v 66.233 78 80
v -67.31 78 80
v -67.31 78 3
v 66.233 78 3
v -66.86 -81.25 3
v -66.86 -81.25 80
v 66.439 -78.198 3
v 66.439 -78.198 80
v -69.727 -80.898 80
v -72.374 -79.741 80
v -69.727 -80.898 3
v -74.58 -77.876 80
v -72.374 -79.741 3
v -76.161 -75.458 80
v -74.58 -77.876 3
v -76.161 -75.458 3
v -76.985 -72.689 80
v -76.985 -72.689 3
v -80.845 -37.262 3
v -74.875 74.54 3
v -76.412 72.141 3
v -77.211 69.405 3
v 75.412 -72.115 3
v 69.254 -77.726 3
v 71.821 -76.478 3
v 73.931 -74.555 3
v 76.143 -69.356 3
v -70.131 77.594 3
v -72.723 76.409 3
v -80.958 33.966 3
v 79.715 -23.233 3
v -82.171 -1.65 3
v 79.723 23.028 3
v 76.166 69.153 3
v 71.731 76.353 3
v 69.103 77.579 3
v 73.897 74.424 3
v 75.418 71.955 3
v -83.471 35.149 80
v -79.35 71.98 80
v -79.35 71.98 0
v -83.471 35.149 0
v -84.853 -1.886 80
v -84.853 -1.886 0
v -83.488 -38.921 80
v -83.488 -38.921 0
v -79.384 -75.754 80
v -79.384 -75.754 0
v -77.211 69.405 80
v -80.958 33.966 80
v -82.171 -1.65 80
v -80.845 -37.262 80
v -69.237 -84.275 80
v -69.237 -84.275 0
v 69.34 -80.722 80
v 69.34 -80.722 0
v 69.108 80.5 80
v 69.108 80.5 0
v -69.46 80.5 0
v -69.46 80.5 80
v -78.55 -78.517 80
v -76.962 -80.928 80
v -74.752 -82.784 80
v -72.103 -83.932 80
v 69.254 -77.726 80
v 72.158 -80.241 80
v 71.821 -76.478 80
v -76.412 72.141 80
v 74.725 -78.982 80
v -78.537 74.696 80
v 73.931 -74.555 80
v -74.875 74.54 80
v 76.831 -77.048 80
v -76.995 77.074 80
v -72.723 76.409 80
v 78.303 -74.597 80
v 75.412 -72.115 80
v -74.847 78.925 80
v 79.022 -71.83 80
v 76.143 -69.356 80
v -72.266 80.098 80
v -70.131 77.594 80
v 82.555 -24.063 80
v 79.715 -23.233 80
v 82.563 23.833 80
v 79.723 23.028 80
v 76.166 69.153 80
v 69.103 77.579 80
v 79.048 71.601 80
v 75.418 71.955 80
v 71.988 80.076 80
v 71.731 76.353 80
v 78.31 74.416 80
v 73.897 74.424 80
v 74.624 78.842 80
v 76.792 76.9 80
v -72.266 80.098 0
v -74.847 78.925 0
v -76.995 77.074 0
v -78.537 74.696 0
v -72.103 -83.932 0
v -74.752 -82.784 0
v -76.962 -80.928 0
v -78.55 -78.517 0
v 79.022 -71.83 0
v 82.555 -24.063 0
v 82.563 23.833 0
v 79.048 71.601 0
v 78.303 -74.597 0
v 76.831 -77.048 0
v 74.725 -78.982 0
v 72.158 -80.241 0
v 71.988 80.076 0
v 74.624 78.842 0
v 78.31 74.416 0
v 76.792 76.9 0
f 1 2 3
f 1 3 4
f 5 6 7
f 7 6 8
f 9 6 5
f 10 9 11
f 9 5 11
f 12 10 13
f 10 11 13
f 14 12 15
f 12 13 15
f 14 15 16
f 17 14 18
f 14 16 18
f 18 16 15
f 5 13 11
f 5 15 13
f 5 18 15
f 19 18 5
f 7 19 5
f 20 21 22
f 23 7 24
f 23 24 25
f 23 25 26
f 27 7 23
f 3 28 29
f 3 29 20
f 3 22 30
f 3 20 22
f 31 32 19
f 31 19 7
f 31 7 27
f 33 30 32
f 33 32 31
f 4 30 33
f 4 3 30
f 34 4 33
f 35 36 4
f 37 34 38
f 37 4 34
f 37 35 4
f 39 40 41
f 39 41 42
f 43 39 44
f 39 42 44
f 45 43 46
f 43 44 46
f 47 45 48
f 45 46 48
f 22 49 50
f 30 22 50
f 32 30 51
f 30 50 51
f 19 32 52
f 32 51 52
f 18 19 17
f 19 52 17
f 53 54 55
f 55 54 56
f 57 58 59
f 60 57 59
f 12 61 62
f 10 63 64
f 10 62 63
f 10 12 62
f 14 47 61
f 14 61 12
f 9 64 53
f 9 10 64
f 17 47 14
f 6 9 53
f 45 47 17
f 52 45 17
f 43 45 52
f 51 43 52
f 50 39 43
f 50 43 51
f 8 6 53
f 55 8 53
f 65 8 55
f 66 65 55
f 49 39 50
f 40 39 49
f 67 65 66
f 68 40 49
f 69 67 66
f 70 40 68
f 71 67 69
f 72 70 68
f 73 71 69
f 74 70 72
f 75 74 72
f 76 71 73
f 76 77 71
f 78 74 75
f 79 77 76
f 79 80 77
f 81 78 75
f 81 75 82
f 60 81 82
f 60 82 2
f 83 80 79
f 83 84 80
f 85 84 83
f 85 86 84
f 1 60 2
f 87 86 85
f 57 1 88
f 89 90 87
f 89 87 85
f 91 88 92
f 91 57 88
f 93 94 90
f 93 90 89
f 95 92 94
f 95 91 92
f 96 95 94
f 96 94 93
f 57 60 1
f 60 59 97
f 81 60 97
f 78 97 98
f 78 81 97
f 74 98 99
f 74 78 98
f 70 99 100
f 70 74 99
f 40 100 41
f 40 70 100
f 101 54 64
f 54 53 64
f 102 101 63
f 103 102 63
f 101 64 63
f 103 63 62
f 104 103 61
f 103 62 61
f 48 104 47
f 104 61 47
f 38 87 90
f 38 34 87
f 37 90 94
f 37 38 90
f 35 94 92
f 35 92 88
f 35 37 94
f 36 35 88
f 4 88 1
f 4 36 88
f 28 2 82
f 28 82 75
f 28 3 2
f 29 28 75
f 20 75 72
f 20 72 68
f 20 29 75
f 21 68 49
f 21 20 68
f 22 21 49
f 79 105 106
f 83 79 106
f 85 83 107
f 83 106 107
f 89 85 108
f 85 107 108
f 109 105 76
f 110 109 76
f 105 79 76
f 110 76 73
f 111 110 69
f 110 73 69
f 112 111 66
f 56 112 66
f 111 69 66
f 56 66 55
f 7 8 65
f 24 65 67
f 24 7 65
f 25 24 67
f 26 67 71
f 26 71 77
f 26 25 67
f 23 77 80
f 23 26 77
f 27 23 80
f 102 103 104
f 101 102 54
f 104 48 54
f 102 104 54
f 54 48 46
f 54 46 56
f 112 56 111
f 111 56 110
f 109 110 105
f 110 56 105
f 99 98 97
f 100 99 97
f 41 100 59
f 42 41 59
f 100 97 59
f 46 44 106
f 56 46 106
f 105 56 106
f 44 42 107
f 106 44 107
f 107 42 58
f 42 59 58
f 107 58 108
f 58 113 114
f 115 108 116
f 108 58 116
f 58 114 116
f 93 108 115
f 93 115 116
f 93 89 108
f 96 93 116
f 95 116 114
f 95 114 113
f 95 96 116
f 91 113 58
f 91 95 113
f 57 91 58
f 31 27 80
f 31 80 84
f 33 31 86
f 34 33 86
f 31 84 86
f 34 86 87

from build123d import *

# Parameters (mm, degrees)
PAD_DEPTH    = 80
POCKET_DEPTH = 77
FILLET_R     = 10
FILLET001_R  = 10


with BuildPart() as part:
    # Sketch → Pad (new body)
    with BuildSketch(Plane.XY):
        with BuildLine():
            ThreePointArc((78, -80.5), (83, 0), (78, 80.5))
            Line((78, 80.5), (-78, 80.5))
            ThreePointArc((-78, 80.5), (-84.853217, -2), (-78, -84.5))
            Line((-78, -84.5), (78, -80.5))
        make_face()
    extrude(amount=PAD_DEPTH)

    # Sketch001 (on Face6 of Pad) → Pocket (cut)
    with BuildSketch(Plane.XY.offset(80)):
        with BuildLine():
            Line((-75.633377, -81.450424), (75.073144, -78))
            ThreePointArc((75.073144, -78), (80.164748, 0), (75.073144, 78))
            Line((-75.914692, 78), (75.073144, 78))
            ThreePointArc((-75.914692, 78), (-82.171076, -1.736498), (-75.633377, -81.450424))
        make_face()
    extrude(amount=-POCKET_DEPTH, mode=Mode.SUBTRACT)

    # Fillet
    fillet_edges = [part.edges().sort_by_distance(p)[0] for p in [
        (-75.914692, 78, 41.5),
        (75.073144, 78, 41.5),
        (-75.633377, -81.450424, 41.5),
        (75.073144, -78, 41.5),
    ]]
    fillet(fillet_edges, radius=FILLET_R)

    # Fillet001
    fillet001_edges = [part.edges().sort_by_distance(p)[0] for p in [
        (78, 80.5, 40),
        (78, -80.5, 40),
        (-78, 80.5, 40),
        (-78, -84.5, 40),
    ]]
    fillet(fillet001_edges, radius=FILLET001_R)


solid = part.part
